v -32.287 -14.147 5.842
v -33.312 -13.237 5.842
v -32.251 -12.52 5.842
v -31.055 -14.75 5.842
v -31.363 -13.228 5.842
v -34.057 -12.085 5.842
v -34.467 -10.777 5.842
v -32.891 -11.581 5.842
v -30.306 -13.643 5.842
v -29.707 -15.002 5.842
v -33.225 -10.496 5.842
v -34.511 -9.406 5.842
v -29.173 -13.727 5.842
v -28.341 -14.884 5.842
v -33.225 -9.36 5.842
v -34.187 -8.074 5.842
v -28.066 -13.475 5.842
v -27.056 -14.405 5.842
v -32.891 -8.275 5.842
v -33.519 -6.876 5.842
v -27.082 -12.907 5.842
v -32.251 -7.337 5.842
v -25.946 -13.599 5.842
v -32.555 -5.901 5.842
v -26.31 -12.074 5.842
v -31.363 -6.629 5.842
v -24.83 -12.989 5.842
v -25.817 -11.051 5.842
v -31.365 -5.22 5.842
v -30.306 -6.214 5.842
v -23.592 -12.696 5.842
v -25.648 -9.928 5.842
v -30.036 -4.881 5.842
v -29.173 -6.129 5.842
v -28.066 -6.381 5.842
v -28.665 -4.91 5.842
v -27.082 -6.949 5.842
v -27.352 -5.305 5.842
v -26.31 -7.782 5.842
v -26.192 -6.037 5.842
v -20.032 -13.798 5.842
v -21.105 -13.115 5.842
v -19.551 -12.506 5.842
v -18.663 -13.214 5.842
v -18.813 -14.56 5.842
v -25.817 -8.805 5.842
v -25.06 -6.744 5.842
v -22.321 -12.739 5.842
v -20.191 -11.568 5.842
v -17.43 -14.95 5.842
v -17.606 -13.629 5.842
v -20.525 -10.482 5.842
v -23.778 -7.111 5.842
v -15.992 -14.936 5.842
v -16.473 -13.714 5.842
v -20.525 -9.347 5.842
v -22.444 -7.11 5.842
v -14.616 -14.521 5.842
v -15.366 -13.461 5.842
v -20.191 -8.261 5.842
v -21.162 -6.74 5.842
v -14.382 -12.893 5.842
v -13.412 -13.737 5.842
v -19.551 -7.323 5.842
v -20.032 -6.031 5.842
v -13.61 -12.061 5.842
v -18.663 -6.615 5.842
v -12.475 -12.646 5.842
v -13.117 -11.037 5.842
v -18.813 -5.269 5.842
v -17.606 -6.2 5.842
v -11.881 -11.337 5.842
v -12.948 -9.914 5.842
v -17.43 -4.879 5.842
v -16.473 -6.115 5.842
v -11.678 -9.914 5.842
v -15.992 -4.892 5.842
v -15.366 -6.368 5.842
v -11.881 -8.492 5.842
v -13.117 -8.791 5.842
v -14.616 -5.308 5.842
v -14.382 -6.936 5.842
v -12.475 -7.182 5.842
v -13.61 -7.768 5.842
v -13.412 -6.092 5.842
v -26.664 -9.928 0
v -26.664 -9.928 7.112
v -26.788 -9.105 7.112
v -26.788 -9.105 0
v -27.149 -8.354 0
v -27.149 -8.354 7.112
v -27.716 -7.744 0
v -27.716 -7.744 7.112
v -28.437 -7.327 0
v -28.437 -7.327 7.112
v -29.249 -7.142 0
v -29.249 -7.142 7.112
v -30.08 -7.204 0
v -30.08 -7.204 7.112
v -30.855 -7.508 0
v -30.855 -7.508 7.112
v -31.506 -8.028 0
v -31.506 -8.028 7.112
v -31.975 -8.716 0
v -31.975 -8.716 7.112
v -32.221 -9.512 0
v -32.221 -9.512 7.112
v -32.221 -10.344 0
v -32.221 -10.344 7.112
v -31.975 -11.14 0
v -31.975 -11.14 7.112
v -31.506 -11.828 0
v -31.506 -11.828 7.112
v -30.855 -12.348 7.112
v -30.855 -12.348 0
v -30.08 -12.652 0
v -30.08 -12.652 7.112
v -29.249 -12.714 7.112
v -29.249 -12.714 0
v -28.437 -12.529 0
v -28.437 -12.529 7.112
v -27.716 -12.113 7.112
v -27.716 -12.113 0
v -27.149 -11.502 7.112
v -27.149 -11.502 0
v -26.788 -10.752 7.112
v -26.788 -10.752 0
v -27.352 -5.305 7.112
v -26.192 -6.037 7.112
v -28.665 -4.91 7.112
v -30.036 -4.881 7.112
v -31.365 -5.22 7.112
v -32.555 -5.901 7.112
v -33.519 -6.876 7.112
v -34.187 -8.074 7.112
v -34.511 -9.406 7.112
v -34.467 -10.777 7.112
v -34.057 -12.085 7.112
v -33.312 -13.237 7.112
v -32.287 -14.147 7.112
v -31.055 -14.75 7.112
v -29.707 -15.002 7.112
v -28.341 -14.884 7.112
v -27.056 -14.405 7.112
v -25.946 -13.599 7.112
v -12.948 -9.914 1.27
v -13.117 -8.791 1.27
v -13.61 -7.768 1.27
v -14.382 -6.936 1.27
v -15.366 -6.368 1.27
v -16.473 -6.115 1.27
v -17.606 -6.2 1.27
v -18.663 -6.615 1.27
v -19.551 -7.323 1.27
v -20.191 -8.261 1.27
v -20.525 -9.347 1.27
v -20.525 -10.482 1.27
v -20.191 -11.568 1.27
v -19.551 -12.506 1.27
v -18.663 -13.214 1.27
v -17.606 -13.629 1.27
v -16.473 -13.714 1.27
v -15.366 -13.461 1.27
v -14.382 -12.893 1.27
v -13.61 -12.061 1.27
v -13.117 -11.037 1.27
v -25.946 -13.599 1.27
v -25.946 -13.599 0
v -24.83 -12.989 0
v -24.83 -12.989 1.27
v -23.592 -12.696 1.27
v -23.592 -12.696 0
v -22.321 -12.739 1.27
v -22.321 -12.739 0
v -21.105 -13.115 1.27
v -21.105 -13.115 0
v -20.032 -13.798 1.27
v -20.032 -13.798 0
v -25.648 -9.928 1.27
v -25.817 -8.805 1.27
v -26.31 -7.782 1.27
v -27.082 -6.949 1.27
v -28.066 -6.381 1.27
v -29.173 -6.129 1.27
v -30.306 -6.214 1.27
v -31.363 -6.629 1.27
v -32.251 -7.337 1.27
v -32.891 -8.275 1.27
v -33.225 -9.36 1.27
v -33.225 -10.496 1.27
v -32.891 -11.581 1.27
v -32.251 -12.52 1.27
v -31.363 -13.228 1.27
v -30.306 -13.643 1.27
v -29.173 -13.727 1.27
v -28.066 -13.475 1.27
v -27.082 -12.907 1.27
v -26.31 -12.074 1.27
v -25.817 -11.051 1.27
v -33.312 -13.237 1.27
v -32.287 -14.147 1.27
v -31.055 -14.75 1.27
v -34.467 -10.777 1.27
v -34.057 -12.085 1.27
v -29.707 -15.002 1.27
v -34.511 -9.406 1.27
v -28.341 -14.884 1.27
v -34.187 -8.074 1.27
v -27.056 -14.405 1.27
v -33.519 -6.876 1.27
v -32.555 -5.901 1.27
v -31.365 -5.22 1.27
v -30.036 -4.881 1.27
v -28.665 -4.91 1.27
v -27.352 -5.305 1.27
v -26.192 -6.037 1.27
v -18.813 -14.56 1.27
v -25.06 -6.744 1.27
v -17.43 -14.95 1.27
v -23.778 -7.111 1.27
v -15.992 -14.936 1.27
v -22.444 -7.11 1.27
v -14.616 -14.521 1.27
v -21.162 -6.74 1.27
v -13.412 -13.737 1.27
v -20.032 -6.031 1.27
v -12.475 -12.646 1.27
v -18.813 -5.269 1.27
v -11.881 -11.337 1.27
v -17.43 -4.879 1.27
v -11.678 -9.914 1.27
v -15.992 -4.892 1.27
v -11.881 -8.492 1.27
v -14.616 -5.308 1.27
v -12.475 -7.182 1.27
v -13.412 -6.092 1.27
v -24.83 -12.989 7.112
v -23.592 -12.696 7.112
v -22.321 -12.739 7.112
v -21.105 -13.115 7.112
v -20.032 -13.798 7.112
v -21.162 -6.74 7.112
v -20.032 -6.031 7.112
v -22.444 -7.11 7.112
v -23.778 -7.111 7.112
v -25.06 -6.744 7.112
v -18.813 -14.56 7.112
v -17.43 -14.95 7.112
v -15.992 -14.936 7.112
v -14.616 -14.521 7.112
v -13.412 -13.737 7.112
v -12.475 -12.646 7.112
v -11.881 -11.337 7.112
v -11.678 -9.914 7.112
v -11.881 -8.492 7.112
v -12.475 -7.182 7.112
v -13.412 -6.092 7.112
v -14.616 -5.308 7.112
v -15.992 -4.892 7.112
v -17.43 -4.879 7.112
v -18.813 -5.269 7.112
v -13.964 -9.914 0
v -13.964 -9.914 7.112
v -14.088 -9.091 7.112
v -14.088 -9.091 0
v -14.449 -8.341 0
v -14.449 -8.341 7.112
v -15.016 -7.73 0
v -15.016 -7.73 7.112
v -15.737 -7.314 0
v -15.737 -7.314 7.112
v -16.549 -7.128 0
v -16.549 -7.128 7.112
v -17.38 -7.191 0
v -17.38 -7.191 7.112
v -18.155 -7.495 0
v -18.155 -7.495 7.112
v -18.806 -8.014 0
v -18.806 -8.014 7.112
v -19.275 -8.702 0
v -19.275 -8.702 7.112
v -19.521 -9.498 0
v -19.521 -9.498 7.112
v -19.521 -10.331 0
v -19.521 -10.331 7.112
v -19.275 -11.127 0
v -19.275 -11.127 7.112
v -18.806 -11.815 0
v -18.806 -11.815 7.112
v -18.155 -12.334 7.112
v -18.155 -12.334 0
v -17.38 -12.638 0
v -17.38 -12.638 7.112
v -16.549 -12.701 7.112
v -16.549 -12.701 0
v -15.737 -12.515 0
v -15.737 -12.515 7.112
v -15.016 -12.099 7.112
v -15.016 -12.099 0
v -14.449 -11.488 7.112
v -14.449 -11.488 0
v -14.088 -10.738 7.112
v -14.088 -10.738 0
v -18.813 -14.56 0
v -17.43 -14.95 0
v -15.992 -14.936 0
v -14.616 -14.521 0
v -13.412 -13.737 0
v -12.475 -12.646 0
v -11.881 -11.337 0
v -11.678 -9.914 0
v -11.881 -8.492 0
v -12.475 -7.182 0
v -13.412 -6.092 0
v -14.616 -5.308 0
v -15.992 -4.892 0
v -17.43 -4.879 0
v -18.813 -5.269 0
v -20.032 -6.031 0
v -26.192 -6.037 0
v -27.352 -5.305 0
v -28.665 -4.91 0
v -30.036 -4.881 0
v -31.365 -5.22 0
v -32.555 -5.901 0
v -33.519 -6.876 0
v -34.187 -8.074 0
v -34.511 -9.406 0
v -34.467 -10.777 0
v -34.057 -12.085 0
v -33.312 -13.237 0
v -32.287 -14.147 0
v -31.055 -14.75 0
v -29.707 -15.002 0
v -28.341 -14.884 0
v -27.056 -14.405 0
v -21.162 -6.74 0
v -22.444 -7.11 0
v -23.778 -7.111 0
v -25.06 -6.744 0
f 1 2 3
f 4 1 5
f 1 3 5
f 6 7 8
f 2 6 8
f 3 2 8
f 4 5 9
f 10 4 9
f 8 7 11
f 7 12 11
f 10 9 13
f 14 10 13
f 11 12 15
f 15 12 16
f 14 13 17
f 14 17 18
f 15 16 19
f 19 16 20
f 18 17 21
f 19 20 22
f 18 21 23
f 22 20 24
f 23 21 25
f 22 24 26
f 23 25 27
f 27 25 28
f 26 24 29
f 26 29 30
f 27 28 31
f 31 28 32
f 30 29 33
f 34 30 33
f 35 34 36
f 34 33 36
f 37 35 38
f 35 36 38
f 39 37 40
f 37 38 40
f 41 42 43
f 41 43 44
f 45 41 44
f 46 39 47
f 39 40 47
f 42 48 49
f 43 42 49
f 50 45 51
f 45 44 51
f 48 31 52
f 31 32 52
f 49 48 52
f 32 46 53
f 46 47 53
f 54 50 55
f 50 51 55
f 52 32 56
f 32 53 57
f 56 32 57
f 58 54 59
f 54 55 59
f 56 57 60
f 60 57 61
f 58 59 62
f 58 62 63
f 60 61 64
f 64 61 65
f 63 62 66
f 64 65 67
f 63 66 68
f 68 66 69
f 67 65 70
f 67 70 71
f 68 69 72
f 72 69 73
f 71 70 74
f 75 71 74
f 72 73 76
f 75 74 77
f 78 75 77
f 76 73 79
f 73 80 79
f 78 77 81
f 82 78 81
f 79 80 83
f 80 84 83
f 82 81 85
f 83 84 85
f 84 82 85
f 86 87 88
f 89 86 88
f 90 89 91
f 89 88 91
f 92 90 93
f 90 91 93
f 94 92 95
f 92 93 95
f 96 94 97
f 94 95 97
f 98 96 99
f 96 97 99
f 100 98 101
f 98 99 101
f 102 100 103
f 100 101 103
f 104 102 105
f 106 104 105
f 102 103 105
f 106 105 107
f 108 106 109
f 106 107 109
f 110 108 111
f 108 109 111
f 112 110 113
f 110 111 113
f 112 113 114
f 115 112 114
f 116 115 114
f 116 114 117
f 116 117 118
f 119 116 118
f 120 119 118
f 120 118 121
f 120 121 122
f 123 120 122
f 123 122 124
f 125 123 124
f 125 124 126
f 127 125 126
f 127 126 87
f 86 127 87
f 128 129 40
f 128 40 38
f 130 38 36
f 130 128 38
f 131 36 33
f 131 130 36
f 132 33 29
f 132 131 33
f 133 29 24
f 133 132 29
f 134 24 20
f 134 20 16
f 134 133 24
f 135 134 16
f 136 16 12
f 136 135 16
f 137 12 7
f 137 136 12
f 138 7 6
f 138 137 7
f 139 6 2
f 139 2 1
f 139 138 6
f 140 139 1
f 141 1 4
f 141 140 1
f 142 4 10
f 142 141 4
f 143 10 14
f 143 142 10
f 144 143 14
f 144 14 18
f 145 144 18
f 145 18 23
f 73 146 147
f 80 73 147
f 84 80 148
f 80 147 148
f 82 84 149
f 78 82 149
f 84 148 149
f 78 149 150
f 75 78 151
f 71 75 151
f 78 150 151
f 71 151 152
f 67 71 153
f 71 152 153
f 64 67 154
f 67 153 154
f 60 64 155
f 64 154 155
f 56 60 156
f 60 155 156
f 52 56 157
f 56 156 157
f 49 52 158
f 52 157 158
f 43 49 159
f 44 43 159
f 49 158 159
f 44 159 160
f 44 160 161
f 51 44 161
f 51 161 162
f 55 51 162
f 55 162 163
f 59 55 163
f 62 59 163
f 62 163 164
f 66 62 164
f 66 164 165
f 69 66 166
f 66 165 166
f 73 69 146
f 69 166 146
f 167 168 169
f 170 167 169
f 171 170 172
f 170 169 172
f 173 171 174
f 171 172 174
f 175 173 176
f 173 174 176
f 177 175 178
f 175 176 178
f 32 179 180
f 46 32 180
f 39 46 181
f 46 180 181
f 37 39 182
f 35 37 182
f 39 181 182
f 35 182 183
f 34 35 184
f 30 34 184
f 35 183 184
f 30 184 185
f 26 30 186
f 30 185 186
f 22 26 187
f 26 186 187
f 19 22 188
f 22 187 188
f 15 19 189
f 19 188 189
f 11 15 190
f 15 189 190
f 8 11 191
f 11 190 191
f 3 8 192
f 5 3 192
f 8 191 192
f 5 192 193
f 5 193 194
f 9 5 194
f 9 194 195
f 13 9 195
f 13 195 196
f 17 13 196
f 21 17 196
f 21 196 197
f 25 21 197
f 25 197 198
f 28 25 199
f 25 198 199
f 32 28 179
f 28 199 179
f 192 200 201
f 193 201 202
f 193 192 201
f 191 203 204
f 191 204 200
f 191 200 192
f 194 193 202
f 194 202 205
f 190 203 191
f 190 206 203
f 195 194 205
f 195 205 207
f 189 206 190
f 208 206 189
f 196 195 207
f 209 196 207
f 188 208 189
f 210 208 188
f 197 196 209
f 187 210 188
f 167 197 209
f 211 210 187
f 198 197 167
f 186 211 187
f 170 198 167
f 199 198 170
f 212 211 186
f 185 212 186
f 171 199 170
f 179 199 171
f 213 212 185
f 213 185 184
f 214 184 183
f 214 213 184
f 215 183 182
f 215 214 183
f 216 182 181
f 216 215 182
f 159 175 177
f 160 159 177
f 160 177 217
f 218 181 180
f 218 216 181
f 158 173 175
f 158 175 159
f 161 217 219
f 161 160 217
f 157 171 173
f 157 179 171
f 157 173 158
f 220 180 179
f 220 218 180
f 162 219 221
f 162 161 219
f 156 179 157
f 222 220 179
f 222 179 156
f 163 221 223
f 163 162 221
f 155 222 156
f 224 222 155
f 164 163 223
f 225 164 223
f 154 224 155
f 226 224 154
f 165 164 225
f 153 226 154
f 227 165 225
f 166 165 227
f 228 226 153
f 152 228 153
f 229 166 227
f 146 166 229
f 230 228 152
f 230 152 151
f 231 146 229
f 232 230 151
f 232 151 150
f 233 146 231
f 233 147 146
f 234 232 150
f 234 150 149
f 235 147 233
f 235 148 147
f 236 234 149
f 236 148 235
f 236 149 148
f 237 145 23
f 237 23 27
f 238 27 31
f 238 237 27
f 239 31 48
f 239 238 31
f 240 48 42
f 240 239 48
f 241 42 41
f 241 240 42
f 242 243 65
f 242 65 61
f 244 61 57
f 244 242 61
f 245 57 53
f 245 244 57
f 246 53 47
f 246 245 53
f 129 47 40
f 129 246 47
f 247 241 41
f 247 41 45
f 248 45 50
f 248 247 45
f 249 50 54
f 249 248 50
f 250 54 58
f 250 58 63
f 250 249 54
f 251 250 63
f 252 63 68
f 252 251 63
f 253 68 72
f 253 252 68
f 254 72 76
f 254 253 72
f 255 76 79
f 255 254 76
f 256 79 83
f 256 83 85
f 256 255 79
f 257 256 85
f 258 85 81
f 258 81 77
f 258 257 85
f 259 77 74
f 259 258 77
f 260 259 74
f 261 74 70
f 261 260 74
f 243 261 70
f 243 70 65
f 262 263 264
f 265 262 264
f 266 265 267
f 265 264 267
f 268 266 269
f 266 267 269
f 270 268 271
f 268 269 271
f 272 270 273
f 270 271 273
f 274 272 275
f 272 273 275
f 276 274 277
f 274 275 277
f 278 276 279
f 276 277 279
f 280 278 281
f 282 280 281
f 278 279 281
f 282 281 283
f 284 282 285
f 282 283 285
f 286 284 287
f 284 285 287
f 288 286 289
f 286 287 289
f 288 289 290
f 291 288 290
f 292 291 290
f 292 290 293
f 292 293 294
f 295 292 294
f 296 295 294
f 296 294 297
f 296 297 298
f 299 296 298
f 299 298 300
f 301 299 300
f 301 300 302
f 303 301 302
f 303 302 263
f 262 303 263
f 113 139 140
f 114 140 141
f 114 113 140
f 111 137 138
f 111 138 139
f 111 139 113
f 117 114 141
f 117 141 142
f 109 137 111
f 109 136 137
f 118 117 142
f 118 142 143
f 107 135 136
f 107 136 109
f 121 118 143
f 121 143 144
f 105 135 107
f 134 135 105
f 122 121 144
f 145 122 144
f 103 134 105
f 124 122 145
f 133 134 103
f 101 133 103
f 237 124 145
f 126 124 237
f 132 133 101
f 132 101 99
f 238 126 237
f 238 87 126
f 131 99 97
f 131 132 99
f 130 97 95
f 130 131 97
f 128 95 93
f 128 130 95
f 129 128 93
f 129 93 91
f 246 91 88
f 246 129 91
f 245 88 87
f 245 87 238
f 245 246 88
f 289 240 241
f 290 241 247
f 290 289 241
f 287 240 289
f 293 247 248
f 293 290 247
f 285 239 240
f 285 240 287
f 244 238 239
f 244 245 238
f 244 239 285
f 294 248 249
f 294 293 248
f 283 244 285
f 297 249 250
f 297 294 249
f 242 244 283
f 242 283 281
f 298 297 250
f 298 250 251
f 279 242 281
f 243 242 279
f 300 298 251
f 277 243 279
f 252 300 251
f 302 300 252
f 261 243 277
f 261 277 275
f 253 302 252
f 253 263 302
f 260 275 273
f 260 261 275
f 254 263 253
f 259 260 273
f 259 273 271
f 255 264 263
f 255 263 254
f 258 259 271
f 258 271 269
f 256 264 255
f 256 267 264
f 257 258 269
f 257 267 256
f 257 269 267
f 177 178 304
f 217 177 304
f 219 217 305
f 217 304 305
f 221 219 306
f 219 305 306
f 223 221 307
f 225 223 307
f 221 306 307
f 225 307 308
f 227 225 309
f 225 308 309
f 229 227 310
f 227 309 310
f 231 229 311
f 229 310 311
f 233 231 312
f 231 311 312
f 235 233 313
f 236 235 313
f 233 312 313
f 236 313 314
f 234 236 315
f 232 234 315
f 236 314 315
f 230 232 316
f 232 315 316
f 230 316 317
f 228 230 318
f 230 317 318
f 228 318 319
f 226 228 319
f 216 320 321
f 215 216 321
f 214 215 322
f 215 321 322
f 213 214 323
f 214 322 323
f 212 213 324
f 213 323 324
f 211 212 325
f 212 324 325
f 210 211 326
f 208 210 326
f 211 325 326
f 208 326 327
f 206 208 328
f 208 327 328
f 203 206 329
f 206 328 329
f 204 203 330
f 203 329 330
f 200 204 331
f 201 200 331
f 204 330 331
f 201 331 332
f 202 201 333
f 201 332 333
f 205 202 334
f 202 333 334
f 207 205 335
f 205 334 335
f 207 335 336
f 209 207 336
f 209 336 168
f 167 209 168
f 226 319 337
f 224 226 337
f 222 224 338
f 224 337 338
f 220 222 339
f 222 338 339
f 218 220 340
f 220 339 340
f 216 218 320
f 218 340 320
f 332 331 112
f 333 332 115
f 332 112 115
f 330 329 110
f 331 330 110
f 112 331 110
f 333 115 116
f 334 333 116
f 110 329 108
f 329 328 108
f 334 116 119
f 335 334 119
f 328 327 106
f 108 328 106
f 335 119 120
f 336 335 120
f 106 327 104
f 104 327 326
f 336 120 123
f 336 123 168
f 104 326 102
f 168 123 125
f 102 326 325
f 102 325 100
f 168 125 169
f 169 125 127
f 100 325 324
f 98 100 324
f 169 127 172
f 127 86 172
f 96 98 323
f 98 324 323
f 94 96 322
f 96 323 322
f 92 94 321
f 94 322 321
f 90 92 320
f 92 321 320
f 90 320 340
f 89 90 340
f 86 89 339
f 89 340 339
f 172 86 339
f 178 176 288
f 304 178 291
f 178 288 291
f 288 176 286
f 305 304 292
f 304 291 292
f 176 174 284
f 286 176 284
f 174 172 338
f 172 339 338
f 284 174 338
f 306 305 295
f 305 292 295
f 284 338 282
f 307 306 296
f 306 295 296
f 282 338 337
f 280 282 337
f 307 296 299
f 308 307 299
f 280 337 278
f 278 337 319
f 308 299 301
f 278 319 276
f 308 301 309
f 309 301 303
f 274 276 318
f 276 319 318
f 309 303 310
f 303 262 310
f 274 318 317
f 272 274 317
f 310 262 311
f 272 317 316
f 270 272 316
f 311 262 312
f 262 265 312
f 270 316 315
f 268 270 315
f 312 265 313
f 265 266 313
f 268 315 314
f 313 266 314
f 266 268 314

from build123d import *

# Parameters (mm, degrees)
BOSS_EXTRUDE1_DEPTH = 1.27
SKETCH2_R           = 3.81
BOSS_EXTRUDE2_DEPTH = 4.572
SKETCH5_R           = 2.794
CUT_EXTRUDE1_DEPTH  = 24.638


with BuildPart() as part:
    # Sketch1 → Boss-Extrude1 (new body)
    with BuildSketch(Plane.XY):
        with BuildLine():
            ThreePointArc((-26.191844276, -6.037143701), (-34.535215397, -10.092878556), (-25.946396087, -13.599017422))
            ThreePointArc((-25.946396087, -13.599017422), (-22.954821865, -12.674647532), (-20.032282841, -13.798365326))
            ThreePointArc((-20.032282841, -13.798365326), (-11.677896645, -9.914450414), (-20.032282841, -6.030535502))
            ThreePointArc((-20.032282841, -6.030535502), (-23.110858628, -7.156966052), (-26.191844276, -6.037143701))
        make_face()
    boss_extrude1 = extrude(amount=BOSS_EXTRUDE1_DEPTH)

    # Sketch2 → Boss-Extrude2 (add)
    with BuildSketch(Plane.XY.offset(1.27)):
        with Locations((-16.757896645, -9.914450414)):
            Circle(SKETCH2_R)
        with Locations((-29.457889337, -9.928075423)):
            Circle(SKETCH2_R)
    extrude(amount=BOSS_EXTRUDE2_DEPTH)

    # Mirror1: Boss-Extrude1 across plane
    add(boss_extrude1.mirror(Plane.XY.offset(3.556)))

    # Sketch5 → Cut-Extrude1 (cut)
    with BuildSketch(Plane.XY.offset(7.112)):
        with Locations((-29.457889337, -9.928075423)):
            Circle(SKETCH5_R)
        with Locations((-16.757896645, -9.914450414)):
            Circle(SKETCH5_R)
    extrude(amount=-CUT_EXTRUDE1_DEPTH, mode=Mode.SUBTRACT)


solid = part.part
